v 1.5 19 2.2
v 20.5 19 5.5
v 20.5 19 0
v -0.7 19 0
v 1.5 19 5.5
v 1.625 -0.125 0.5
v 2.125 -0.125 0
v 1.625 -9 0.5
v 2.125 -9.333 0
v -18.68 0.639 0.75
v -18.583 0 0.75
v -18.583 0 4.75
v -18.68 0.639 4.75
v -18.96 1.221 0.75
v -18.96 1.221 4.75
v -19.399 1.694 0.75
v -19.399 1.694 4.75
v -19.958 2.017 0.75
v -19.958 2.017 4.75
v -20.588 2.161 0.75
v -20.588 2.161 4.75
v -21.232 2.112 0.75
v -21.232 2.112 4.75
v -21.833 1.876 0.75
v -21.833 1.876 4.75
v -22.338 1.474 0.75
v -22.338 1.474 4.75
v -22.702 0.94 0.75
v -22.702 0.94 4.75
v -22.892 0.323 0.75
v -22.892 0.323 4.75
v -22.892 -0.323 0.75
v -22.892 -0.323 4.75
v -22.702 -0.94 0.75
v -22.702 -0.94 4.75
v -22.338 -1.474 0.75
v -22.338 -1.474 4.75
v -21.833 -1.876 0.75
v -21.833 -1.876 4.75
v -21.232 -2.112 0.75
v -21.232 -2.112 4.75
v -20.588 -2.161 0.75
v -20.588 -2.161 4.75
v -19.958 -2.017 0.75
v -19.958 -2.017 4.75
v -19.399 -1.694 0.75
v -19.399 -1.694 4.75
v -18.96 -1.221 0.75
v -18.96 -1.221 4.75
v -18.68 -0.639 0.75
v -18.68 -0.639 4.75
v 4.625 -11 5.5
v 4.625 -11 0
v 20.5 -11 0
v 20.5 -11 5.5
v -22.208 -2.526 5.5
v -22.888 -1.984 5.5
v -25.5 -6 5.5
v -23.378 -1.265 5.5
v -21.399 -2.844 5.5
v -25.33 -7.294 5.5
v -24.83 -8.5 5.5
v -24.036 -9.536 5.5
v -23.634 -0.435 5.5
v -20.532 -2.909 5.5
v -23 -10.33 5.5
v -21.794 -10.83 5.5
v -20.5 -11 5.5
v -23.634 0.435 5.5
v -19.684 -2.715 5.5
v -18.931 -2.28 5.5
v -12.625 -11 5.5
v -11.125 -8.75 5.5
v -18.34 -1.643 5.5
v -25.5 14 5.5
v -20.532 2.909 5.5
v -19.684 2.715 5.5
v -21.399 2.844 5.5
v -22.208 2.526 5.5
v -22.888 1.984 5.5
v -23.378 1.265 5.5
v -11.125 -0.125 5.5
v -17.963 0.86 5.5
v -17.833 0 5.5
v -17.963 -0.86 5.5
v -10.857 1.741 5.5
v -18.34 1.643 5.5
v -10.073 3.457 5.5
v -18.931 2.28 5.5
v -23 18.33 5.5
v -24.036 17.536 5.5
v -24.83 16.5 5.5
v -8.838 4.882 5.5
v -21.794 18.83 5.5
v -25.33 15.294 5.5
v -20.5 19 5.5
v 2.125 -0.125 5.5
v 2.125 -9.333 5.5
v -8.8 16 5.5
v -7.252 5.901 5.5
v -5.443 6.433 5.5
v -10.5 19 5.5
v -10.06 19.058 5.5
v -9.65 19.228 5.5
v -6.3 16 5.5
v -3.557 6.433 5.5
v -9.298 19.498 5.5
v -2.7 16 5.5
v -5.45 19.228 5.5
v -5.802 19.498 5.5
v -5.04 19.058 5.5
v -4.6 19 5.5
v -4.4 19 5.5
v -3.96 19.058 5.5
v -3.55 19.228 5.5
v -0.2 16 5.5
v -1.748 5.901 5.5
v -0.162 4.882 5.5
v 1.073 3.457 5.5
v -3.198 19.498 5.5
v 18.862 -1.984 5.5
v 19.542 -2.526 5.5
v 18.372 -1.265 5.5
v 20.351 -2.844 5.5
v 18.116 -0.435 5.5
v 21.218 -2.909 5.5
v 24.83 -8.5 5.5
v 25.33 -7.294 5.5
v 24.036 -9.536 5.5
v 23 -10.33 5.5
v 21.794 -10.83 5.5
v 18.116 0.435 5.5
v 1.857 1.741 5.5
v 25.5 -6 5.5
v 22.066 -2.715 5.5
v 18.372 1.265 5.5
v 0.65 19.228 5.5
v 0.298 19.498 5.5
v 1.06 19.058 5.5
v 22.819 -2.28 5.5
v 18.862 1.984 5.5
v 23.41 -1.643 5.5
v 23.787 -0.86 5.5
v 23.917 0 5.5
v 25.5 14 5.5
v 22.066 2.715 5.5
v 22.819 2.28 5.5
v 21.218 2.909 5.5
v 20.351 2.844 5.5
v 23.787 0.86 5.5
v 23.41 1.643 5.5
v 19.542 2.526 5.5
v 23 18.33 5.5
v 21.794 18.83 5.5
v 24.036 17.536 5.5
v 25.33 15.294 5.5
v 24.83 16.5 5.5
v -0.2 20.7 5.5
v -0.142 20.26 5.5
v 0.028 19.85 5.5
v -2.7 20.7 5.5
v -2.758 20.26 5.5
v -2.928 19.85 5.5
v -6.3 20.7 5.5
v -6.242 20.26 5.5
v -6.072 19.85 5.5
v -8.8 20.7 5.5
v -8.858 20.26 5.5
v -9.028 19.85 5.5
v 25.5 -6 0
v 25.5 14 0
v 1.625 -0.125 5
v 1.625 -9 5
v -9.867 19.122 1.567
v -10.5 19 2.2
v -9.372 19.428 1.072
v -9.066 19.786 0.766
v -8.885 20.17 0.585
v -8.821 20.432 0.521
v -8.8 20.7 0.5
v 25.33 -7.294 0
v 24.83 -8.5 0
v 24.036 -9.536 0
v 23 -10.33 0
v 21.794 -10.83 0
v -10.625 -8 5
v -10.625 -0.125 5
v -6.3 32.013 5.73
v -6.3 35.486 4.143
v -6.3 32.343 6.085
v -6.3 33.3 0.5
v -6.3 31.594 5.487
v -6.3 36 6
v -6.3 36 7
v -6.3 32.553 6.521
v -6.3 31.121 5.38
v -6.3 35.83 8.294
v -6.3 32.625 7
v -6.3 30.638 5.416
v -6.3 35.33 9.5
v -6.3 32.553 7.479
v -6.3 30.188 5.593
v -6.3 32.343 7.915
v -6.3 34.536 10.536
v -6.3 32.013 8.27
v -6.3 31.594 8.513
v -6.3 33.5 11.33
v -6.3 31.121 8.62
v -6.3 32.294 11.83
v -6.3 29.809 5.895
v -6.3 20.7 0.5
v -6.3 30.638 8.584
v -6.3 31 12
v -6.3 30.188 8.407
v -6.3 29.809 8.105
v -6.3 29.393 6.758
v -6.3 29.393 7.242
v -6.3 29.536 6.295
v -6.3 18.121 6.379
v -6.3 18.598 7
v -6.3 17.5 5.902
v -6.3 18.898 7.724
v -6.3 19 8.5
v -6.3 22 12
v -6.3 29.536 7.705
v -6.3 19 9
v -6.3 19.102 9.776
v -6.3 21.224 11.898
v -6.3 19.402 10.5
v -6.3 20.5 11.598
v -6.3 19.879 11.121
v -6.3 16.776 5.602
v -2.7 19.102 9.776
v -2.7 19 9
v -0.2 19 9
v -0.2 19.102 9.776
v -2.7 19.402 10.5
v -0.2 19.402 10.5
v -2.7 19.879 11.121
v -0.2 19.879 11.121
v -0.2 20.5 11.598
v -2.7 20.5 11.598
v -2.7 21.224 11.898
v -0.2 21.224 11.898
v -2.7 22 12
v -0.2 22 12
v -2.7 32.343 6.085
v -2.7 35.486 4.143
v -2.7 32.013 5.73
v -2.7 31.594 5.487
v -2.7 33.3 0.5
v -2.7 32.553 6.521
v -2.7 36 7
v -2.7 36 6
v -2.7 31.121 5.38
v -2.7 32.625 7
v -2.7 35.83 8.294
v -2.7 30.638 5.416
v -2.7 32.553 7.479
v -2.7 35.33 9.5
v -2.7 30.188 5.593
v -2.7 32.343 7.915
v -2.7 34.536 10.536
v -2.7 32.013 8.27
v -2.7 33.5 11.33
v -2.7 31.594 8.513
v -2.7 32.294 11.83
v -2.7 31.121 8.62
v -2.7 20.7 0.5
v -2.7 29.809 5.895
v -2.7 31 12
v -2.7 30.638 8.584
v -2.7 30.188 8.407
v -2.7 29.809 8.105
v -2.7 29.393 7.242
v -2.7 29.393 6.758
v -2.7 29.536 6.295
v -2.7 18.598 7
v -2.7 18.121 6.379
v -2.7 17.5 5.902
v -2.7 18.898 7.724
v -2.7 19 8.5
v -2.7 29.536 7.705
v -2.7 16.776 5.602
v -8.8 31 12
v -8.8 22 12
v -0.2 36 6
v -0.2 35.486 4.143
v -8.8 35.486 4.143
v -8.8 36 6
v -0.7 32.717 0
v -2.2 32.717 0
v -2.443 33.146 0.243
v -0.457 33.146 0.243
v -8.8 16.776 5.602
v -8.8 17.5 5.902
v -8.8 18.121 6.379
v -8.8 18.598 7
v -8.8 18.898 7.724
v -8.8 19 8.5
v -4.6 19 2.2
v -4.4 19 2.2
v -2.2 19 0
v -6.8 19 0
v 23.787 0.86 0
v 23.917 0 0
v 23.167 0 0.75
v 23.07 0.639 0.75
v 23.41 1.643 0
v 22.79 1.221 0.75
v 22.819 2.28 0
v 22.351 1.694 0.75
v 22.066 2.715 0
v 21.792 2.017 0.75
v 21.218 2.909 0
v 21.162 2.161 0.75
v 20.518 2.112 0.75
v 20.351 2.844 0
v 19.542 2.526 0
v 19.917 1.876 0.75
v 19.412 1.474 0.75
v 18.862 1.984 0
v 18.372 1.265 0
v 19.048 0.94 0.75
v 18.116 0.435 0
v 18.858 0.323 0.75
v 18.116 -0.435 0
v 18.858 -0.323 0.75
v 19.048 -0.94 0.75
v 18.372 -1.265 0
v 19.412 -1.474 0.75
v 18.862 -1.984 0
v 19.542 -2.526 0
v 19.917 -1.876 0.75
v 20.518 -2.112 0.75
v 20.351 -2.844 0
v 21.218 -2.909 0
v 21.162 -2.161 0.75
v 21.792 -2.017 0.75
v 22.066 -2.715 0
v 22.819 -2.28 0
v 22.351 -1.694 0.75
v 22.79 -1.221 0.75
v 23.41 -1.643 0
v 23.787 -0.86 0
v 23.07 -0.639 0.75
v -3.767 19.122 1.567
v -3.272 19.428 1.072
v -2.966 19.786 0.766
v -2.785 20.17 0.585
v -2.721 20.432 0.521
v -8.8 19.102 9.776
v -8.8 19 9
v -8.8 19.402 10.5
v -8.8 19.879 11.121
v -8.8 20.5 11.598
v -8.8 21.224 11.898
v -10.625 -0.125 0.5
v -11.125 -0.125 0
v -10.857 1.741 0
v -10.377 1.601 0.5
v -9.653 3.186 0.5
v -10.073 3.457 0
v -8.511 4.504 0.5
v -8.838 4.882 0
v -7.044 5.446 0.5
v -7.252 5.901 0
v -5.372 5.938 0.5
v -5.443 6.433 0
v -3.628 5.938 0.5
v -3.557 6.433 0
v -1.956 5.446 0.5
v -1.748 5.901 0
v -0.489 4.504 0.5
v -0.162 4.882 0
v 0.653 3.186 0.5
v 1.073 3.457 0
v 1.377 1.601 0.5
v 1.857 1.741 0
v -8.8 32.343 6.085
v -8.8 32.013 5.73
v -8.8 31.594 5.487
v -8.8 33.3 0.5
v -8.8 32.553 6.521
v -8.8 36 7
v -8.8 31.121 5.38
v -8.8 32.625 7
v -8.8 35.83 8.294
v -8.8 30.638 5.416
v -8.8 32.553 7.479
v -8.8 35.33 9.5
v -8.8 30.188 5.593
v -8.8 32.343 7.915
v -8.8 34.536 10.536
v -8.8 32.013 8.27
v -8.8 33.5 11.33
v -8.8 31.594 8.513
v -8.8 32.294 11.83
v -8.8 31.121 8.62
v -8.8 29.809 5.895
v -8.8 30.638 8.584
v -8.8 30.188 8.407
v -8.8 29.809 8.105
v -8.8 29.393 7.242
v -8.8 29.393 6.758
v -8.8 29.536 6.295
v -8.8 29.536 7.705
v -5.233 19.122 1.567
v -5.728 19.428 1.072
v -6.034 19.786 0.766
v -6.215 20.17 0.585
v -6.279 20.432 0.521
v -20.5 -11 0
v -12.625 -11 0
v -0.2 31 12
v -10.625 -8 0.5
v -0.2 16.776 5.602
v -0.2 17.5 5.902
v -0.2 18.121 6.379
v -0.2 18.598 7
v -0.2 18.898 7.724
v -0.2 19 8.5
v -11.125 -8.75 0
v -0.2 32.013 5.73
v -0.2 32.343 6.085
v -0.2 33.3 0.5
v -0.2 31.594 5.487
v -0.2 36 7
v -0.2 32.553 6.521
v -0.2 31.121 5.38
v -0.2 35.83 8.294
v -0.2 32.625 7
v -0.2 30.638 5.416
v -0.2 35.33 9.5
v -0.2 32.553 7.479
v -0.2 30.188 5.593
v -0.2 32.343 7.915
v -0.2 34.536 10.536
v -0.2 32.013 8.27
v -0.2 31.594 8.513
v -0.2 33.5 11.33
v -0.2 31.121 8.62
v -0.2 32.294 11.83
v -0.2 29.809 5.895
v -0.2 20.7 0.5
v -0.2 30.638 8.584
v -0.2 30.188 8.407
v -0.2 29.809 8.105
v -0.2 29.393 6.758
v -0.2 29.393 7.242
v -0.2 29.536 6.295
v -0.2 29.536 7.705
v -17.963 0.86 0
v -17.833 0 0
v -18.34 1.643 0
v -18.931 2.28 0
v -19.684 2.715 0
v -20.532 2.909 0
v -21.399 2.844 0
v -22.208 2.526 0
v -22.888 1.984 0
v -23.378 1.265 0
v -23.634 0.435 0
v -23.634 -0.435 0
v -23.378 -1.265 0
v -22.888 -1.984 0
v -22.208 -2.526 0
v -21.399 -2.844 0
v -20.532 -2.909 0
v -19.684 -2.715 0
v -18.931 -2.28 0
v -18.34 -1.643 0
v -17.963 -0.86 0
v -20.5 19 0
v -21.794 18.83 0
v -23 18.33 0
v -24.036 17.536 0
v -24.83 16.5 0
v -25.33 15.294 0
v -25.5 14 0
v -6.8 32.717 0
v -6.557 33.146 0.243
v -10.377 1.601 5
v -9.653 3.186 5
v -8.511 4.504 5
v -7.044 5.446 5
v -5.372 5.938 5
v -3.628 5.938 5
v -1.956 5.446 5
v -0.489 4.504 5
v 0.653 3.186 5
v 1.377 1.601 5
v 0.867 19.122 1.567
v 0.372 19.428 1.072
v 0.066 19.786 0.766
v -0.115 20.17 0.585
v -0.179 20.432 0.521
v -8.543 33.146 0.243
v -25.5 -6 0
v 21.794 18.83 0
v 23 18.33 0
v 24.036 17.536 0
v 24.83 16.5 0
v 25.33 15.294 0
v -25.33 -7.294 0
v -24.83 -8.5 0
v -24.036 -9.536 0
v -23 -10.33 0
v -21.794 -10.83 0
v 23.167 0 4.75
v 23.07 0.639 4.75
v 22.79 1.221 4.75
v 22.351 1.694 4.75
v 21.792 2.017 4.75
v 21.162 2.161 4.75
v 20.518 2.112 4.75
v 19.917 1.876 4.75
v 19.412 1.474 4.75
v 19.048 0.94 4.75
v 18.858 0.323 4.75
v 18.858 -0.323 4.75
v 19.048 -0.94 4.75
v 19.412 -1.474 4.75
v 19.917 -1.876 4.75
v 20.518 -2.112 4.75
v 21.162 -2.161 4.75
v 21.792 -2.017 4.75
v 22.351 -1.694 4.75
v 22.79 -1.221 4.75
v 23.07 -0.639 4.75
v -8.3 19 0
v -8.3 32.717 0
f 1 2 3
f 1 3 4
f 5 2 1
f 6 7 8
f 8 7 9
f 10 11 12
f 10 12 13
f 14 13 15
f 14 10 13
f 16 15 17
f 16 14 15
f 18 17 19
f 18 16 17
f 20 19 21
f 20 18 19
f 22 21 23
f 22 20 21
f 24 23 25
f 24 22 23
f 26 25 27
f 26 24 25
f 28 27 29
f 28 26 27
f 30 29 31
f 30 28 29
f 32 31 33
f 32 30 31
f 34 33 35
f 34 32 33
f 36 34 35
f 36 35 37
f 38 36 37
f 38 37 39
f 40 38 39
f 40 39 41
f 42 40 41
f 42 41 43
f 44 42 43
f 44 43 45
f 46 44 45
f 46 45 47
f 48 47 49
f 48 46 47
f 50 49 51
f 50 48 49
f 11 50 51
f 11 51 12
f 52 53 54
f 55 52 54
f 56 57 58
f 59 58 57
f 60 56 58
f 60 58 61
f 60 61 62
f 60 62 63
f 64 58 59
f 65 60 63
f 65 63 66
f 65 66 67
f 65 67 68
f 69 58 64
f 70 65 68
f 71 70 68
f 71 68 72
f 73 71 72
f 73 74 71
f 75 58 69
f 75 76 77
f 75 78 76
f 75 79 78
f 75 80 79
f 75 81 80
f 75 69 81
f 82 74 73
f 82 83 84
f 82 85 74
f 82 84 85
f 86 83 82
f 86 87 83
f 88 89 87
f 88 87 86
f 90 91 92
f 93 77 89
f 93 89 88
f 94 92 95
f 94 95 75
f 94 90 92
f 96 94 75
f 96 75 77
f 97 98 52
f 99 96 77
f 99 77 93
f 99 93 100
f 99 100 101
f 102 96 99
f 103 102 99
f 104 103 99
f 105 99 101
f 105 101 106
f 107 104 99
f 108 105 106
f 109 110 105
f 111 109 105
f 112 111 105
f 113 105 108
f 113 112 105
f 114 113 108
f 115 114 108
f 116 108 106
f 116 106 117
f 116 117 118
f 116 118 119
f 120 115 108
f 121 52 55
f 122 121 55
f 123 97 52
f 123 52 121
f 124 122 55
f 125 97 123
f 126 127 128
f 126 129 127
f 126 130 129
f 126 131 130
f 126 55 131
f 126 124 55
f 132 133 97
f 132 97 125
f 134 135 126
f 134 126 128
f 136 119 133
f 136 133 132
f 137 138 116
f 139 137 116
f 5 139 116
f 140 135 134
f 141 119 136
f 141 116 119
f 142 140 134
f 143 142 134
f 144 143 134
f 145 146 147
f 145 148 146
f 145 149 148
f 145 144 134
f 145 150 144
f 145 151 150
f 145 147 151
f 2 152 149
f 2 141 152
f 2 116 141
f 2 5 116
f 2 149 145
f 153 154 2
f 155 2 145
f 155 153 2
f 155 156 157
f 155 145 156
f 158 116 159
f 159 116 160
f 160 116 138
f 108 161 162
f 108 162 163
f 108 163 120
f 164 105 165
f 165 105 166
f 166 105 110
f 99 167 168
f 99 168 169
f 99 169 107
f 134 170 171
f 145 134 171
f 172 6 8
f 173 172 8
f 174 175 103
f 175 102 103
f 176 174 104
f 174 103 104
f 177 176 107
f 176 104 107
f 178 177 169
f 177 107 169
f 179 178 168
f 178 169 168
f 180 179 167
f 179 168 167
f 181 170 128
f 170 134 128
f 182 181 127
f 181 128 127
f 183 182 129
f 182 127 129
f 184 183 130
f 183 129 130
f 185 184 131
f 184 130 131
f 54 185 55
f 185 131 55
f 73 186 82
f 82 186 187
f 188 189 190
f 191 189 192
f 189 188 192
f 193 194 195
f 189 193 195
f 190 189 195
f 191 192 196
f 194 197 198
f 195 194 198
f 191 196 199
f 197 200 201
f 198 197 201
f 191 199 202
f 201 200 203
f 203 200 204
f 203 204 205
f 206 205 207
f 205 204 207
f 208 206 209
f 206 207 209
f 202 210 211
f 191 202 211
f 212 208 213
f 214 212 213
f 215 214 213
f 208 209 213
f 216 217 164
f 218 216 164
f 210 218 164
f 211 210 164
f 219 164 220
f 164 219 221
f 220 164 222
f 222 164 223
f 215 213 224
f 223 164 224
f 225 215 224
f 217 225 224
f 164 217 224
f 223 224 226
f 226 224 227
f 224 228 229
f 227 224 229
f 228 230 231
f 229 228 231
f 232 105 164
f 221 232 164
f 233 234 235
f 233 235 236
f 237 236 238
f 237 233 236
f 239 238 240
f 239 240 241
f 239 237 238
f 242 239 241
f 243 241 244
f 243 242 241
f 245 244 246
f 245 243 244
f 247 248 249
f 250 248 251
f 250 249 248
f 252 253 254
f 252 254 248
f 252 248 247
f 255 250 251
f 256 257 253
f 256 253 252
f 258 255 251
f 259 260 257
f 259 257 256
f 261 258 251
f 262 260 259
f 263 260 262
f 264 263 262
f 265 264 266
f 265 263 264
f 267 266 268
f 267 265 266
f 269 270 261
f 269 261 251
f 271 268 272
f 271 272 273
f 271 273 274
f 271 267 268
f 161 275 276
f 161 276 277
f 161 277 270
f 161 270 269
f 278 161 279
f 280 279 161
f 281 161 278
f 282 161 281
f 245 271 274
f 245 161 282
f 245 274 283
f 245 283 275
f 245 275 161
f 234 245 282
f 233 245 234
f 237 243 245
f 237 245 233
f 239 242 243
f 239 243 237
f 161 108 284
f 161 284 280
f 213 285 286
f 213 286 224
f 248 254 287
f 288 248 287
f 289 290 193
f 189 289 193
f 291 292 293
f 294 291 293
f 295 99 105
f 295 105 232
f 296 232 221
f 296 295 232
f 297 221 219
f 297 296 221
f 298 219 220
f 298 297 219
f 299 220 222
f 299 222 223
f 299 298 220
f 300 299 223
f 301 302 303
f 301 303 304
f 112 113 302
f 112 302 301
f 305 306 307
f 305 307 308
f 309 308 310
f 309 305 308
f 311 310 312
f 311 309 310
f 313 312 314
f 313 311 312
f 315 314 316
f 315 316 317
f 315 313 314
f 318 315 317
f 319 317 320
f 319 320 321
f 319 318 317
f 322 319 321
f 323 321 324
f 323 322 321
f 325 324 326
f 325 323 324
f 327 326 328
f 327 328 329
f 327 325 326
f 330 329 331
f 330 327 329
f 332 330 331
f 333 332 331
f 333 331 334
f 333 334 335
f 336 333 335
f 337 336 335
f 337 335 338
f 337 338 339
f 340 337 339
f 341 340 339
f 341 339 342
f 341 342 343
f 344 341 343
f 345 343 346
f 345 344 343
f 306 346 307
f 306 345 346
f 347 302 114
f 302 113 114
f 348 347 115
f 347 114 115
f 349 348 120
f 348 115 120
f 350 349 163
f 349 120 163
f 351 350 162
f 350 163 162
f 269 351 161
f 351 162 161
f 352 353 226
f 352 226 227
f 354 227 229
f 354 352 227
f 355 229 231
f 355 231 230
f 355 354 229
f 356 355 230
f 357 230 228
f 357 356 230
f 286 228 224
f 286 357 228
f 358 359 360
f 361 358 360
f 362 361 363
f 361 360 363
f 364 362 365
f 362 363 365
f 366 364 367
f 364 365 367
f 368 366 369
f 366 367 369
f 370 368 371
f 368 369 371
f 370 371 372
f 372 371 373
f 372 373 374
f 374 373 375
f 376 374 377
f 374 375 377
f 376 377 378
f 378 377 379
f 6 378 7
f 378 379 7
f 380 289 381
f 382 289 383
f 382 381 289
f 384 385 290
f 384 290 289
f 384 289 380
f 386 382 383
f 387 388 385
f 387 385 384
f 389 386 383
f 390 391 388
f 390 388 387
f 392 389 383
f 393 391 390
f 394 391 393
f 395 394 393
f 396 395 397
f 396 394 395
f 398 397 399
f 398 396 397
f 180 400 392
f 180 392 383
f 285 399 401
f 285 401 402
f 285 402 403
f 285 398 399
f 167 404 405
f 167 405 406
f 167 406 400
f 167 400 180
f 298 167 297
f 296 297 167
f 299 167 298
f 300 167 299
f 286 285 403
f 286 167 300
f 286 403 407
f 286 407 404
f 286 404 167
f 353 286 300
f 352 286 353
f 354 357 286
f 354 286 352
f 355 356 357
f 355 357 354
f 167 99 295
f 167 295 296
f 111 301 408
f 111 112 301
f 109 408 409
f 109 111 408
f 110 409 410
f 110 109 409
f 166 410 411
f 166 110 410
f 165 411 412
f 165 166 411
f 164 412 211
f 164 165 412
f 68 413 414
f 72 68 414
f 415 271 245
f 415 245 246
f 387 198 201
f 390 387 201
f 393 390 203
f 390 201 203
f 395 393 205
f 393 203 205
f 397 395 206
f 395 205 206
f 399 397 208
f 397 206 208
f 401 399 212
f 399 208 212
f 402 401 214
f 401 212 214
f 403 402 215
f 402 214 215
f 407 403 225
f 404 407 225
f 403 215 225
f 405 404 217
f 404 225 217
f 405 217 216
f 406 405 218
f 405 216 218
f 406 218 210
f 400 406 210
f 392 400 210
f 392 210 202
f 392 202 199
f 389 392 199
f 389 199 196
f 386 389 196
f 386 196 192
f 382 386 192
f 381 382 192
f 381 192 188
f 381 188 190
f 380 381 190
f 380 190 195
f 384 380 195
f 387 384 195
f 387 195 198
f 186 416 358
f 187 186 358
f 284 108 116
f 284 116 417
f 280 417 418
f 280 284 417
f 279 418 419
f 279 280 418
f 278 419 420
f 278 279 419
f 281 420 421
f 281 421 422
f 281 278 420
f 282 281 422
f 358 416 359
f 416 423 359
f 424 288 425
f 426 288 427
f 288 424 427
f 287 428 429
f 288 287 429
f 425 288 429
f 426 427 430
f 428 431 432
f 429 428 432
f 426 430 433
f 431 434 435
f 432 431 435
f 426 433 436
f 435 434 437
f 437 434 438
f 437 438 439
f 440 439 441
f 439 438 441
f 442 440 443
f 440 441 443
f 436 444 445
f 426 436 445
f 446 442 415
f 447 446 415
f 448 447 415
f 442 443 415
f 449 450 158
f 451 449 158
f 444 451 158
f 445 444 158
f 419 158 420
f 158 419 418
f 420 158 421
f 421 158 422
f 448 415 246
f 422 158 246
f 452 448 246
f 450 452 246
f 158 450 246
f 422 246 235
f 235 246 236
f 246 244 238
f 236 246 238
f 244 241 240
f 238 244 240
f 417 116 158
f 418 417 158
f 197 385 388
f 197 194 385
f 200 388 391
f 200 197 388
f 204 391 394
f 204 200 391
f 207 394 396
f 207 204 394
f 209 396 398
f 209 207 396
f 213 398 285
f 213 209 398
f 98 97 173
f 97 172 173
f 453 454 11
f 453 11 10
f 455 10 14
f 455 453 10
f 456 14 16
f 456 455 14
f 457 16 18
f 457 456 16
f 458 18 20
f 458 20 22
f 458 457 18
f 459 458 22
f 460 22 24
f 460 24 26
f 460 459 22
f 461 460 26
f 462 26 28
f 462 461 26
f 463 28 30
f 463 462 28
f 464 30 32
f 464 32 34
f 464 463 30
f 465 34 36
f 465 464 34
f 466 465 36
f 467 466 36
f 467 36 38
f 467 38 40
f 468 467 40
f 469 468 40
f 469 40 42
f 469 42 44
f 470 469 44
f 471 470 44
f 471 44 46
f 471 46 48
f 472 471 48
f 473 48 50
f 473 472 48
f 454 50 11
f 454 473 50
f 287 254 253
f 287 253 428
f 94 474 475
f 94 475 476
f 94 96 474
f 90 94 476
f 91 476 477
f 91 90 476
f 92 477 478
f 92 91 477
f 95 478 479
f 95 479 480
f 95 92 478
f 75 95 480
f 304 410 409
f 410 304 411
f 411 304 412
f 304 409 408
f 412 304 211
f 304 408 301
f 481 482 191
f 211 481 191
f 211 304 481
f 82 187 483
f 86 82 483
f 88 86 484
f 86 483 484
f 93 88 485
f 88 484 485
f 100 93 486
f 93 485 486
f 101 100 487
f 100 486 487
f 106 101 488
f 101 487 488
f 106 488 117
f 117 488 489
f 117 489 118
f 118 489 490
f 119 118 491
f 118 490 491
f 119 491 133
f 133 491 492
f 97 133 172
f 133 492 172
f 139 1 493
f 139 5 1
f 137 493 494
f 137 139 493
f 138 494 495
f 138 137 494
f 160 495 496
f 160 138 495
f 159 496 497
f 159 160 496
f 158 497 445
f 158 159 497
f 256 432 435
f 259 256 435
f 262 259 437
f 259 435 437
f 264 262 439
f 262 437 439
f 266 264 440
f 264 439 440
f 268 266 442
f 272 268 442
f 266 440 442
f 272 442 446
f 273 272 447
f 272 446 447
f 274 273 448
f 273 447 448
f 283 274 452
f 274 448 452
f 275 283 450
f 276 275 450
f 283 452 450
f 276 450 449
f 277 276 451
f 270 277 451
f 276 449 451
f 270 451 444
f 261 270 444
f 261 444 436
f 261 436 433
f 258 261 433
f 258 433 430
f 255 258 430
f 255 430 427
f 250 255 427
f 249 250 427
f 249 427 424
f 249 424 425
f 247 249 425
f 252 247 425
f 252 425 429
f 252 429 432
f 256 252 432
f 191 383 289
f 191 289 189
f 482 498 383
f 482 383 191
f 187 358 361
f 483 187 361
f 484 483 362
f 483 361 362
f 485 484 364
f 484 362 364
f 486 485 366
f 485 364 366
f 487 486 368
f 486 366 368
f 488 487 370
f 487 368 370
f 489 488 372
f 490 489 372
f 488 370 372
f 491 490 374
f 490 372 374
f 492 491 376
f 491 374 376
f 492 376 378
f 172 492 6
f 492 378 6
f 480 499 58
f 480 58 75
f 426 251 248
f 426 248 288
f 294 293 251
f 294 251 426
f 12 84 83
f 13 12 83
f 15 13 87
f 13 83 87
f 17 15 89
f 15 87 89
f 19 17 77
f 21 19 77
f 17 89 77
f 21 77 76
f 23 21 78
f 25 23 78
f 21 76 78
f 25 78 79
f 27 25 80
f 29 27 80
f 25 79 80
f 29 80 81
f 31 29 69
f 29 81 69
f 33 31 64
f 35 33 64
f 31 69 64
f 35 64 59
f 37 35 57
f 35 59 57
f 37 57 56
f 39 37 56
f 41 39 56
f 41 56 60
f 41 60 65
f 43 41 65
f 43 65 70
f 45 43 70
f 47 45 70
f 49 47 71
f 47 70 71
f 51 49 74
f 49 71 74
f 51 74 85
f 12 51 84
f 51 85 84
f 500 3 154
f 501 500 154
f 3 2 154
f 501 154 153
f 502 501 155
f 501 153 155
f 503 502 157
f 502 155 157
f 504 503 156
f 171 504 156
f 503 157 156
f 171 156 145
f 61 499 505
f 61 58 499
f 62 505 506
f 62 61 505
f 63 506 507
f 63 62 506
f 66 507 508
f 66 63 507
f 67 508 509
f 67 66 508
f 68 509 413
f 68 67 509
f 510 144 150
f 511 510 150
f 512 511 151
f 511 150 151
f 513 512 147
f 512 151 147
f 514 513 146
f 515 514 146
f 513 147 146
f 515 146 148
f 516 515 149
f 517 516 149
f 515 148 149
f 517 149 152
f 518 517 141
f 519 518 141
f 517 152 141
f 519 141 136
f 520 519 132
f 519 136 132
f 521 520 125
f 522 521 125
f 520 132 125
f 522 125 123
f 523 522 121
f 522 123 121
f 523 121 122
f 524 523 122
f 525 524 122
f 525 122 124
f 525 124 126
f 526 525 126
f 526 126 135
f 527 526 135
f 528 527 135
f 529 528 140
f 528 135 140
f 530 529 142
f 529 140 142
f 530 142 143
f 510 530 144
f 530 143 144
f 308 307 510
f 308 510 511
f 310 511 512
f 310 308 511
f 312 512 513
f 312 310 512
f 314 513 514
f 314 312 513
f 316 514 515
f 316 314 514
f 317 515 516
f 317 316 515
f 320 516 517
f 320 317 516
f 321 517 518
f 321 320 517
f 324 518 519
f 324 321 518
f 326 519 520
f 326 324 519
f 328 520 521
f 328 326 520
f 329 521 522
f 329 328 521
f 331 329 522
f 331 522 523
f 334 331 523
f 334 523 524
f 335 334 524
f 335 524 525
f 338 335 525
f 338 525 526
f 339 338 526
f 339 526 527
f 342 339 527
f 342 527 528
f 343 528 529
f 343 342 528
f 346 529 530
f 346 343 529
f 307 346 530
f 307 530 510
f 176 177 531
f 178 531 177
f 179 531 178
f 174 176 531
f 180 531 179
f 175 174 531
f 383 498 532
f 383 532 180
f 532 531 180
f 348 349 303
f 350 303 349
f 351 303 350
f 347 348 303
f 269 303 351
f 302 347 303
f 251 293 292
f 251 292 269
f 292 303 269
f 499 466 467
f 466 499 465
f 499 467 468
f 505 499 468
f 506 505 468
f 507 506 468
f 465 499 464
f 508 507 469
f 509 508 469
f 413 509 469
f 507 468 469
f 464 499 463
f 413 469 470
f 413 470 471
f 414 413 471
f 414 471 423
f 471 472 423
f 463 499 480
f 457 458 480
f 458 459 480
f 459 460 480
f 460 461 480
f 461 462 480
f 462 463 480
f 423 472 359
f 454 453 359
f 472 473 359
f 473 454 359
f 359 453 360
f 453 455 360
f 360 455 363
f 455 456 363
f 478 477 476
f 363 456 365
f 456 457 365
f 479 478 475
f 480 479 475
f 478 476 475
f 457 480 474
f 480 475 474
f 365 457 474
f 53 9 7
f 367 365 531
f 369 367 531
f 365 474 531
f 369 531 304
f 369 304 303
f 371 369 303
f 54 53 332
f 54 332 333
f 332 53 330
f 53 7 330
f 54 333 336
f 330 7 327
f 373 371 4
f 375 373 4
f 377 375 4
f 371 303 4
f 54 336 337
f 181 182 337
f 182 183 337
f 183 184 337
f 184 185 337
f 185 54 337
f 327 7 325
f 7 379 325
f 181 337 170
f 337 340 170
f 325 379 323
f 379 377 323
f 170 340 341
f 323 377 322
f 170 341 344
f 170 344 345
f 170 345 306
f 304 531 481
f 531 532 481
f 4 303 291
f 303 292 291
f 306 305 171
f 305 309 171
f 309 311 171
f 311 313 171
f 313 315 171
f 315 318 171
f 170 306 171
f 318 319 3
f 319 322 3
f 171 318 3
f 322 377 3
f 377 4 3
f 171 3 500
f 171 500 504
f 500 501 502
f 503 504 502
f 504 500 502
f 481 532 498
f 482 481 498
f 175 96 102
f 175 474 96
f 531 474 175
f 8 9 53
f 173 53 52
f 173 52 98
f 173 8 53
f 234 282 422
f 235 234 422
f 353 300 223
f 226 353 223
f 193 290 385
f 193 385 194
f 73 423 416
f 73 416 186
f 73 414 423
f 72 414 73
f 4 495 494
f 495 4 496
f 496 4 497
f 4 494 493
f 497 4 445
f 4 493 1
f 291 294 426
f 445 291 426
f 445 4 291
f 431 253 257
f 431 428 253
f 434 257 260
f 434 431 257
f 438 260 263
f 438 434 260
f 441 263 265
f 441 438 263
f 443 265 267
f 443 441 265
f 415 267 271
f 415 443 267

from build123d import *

# Parameters (mm, degrees)
F0_R          = 2.1666665
F1_DEPTH      = 5.5
F2_SIZE       = 0.75
F3_W          = 51
F3_H          = 8
F4_DEPTH      = 5.5
F5_SIZE       = 0.5
F6_W          = 2.5
F6_H          = 17
F7_DEPTH      = 12
F8_R          = 1.625
F9_DEPTH      = 25.301
F10_T1_DEPTH  = 2.5
F10_T3_DEPTH  = 2.5
F10_T8_DEPTH  = 17.5
F10_T14_DEPTH = 17.5
F10_T17_DEPTH = 17.5
F10_T19_DEPTH = 17.5
F11_R         = 5
F12_SIZE2     = 3
F12_SIZE      = 5
F12_2_SIZE2   = 3
F12_2_SIZE    = 5
F13_SIZE      = 1
F14_R         = 5
F15_SIZE2     = 2
F15_SIZE      = 3
F15_2_SIZE2   = 2
F15_2_SIZE    = 3
F16_T1_DEPTH  = 15.285841494
F16_T3_DEPTH  = 4.0033035506
F16_T5_DEPTH  = 4.0033035506
F17_R         = 1.7


# Not quite as in the source:
# - a fillet or chamfer that OpenCascade refuses, or shapes differently, is made with other operations: its cross-section is extruded or revolved along the edge and cut away or added


with BuildPart() as f1:
    # F0 (on Top) → F1 (new body)
    with BuildSketch(Plane.XY):
        with BuildLine():
            Line((25.5, 11), (-25.5, 11))
            Line((-25.5, 11), (-25.5, -11))
            Line((-25.5, -11), (-10.625, -11))
            Line((-10.625, -11), (-10.625, -0.125))
            ThreePointArc((-10.625, -0.125), (-4.5, 6), (1.625, -0.125))
            Line((1.625, -0.125), (1.625, -11))
            Line((1.625, -11), (25.5, -11))
            Line((25.5, -11), (25.5, 11))
        make_face()
        with Locations((-20.75, 0)):
            Circle(F0_R, mode=Mode.SUBTRACT)
        with Locations((21, 0)):
            Circle(F0_R, mode=Mode.SUBTRACT)
    extrude(amount=F1_DEPTH)

    # F2
    f2_edges = [f1.edges().sort_by_distance(p)[0] for p in [
        (-22.916666, 0, 0),
        (18.833334, 0, 0),
        (18.833334, 0, 5.5),
        (-22.916666, 0, 5.5),
    ]]
    chamfer(f2_edges, length=F2_SIZE)

    # F3 (on Top) → F4 (join, through all)
    with BuildSketch(Plane.XY):
        with Locations((0, 15)):
            Rectangle(F3_W, F3_H)
    extrude(amount=F4_DEPTH)

    # F5
    f5_edges = [f1.edges().sort_by_distance(p)[0] for p in [
        (-4.5, 6, 5.5),
        (-4.5, 6, 0),
        (-10.625, -5.5625, 5.5),
        (-10.625, -5.5625, 0),
        (1.625, -5.5625, 0),
        (1.625, -5.5625, 5.5),
    ]]
    chamfer(f5_edges, length=F5_SIZE)

    # F6 (on Top) → F7 (join)
    with BuildSketch(Plane.XY):
        with Locations((-7.55, 27.5)):
            Rectangle(F6_W, F6_H)
        with Locations((-1.45, 27.5)):
            Rectangle(F6_W, F6_H)
    extrude(amount=F7_DEPTH)

    # F8 (on face) → F9 (cut, through all)
    with BuildSketch(Plane.YZ.offset(-0.2)):
        with Locations((31, 7)):
            Circle(F8_R)
    extrude(amount=-F9_DEPTH, mode=Mode.SUBTRACT)

    # F10: fillet of radius 3 on 5 edges, made by hand

    # F10_s2 → F10_t1 (join)
    with BuildSketch(Plane.YZ.offset(-2.7)):
        with BuildLine():
            ThreePointArc((16, 5.5), (18.1213203436, 6.3786796564), (19, 8.5))
            Line((19, 8.5), (19, 5.5))
            Line((19, 5.5), (16, 5.5))
        make_face()
    extrude(amount=F10_T1_DEPTH)

    # F10_s4 → F10_t3 (join)
    with BuildSketch(Plane.YZ.offset(-8.8)):
        with BuildLine():
            ThreePointArc((16, 5.5), (18.1213203436, 6.3786796564), (19, 8.5))
            Line((19, 8.5), (19, 5.5))
            Line((19, 5.5), (16, 5.5))
        make_face()
    extrude(amount=F10_T3_DEPTH)


with BuildPart() as f10_tool6:
    # F10_s7 → F10_t8 (new body)
    with BuildSketch(Plane.YZ.offset(7.3)):
        with BuildLine():
            ThreePointArc((16, 5.5), (18.1213203436, 6.3786796564), (19, 8.5))
            Line((19, 8.5), (19, 5.5))
            Line((19, 5.5), (16, 5.5))
        make_face()
    extrude(amount=-F10_T8_DEPTH)

    split(bisect_by=Plane.YZ.offset(-6.3), keep=Keep.BOTTOM)

    split(bisect_by=Plane.YZ.offset(-8.8), keep=Keep.TOP)


with BuildPart() as f1_1:
    add(f1.part)

    # F10_t5: union F10_tool6
    add(f10_tool6.part)


with BuildPart() as f10_tool12:
    # F10_s13 → F10_t14 (new body)
    with BuildSketch(Plane.YZ.offset(1.2)):
        with BuildLine():
            ThreePointArc((16, 5.5), (18.1213203436, 6.3786796564), (19, 8.5))
            Line((19, 8.5), (19, 5.5))
            Line((19, 5.5), (16, 5.5))
        make_face()
    extrude(amount=-F10_T14_DEPTH)

    split(bisect_by=Plane.YZ.offset(-0.2), keep=Keep.BOTTOM)

    split(bisect_by=Plane.YZ.offset(-2.7), keep=Keep.TOP)


with BuildPart() as f1_2:
    add(f1_1.part)

    # F10_t11: union F10_tool12
    add(f10_tool12.part)

    # F10_s18 → F10_t17 (cut)
    with BuildSketch(Plane.YZ.offset(-10.2)):
        with BuildLine():
            ThreePointArc((19, 9), (19.8786796564, 11.1213203436), (22, 12))
            Line((22, 12), (19, 12))
            Line((19, 12), (19, 9))
        make_face()
    extrude(amount=F10_T17_DEPTH, mode=Mode.SUBTRACT)

    # F10_s20 → F10_t19 (cut)
    with BuildSketch(Plane.YZ.offset(-16.3)):
        with BuildLine():
            ThreePointArc((19, 9), (19.8786796564, 11.1213203436), (22, 12))
            Line((22, 12), (19, 12))
            Line((19, 12), (19, 9))
        make_face()
    extrude(amount=F10_T19_DEPTH, mode=Mode.SUBTRACT)

    # F11
    f11_edges = [f1_2.edges().sort_by_distance(p)[0] for p in [
        (-1.45, 36, 12),
        (-7.55, 36, 12),
    ]]
    fillet(f11_edges, radius=F11_R)

    # F12
    f12_edges = [f1_2.edges().sort_by_distance(p)[0] for p in [
        (-1.45, 36, 0),
    ]]
    f12_side = f1_2.faces().sort_by_distance((-1.45, 36, 3.5))[0]
    chamfer(f12_edges, length=F12_SIZE, length2=F12_SIZE2, reference=f12_side)

    # F12#2
    f12_2_edges = [f1_2.edges().sort_by_distance(p)[0] for p in [
        (-7.55, 36, 0),
    ]]
    f12_2_side = f1_2.faces().sort_by_distance((-7.55, 36, 3.5))[0]
    chamfer(f12_2_edges, length=F12_2_SIZE, length2=F12_2_SIZE2, reference=f12_2_side)

    # F13
    f13_edges = [f1_2.edges().sort_by_distance(p)[0] for p in [
        (-1.45, 36, 5),
        (-7.55, 36, 5),
    ]]
    chamfer(f13_edges, length=F13_SIZE)

    # F14
    f14_edges = [f1_2.edges().sort_by_distance(p)[0] for p in [
        (25.5, -11, 2.75),
        (-25.5, -11, 2.75),
        (25.5, 19, 2.75),
        (-25.5, 19, 2.75),
    ]]
    fillet(f14_edges, radius=F14_R)

    # F15
    f15_edges = [f1_2.edges().sort_by_distance(p)[0] for p in [
        (-10.625, -11, 2.75),
    ]]
    f15_side = f1_2.faces().sort_by_distance((-10.625, -5.5625, 2.75))[0]
    chamfer(f15_edges, length=F15_SIZE, length2=F15_SIZE2, reference=f15_side)

    # F15#2
    f15_2_edges = [f1_2.edges().sort_by_distance(p)[0] for p in [
        (1.625, -11, 2.75),
    ]]
    f15_2_side = f1_2.faces().sort_by_distance((11.08488, -11, 2.75))[0]
    chamfer(f15_2_edges, length=F15_2_SIZE, length2=F15_2_SIZE2, reference=f15_2_side)

    # F16: chamfer of 0.5 on 6 edges, made by hand

    # F16_s2 → F16_t1 (cut)
    with BuildSketch(Plane.XZ.offset(-34.285841494)):
        Polygon((-0.7, 0), (-0.2, 0.5), (-0.2, 0), align=None)
        Polygon((-2.2, 0), (-2.7, 0.5), (-2.7, 0), align=None)
        Polygon((-6.8, 0), (-6.3, 0.5), (-6.3, 0), align=None)
        Polygon((-8.3, 0), (-8.8, 0.5), (-8.8, 0), align=None)
    extrude(amount=F16_T1_DEPTH, mode=Mode.SUBTRACT)

    # F16_s4 → F16_t3 (cut)
    with BuildSketch(Plane.YZ.offset(-3.4516517753)):
        Polygon((32.7169048105, 0), (33.1456512734, 0.2427521223), (33, 0), align=None)
    extrude(amount=F16_T3_DEPTH, mode=Mode.SUBTRACT)

    # F16_s6 → F16_t5 (cut)
    with BuildSketch(Plane.YZ.offset(-9.5516517753)):
        Polygon((32.7169048105, 0), (33.1456512734, 0.2427521223), (33, 0), align=None)
    extrude(amount=F16_T5_DEPTH, mode=Mode.SUBTRACT)

    # F17
    f17_edges = [f1_2.edges().sort_by_distance(p)[0] for p in [
        (-8.8, 19, 3),
        (-6.3, 19, 3),
        (-2.7, 19, 3),
        (-0.2, 19, 3),
    ]]
    fillet(f17_edges, radius=F17_R)


solid = f1_2.part
